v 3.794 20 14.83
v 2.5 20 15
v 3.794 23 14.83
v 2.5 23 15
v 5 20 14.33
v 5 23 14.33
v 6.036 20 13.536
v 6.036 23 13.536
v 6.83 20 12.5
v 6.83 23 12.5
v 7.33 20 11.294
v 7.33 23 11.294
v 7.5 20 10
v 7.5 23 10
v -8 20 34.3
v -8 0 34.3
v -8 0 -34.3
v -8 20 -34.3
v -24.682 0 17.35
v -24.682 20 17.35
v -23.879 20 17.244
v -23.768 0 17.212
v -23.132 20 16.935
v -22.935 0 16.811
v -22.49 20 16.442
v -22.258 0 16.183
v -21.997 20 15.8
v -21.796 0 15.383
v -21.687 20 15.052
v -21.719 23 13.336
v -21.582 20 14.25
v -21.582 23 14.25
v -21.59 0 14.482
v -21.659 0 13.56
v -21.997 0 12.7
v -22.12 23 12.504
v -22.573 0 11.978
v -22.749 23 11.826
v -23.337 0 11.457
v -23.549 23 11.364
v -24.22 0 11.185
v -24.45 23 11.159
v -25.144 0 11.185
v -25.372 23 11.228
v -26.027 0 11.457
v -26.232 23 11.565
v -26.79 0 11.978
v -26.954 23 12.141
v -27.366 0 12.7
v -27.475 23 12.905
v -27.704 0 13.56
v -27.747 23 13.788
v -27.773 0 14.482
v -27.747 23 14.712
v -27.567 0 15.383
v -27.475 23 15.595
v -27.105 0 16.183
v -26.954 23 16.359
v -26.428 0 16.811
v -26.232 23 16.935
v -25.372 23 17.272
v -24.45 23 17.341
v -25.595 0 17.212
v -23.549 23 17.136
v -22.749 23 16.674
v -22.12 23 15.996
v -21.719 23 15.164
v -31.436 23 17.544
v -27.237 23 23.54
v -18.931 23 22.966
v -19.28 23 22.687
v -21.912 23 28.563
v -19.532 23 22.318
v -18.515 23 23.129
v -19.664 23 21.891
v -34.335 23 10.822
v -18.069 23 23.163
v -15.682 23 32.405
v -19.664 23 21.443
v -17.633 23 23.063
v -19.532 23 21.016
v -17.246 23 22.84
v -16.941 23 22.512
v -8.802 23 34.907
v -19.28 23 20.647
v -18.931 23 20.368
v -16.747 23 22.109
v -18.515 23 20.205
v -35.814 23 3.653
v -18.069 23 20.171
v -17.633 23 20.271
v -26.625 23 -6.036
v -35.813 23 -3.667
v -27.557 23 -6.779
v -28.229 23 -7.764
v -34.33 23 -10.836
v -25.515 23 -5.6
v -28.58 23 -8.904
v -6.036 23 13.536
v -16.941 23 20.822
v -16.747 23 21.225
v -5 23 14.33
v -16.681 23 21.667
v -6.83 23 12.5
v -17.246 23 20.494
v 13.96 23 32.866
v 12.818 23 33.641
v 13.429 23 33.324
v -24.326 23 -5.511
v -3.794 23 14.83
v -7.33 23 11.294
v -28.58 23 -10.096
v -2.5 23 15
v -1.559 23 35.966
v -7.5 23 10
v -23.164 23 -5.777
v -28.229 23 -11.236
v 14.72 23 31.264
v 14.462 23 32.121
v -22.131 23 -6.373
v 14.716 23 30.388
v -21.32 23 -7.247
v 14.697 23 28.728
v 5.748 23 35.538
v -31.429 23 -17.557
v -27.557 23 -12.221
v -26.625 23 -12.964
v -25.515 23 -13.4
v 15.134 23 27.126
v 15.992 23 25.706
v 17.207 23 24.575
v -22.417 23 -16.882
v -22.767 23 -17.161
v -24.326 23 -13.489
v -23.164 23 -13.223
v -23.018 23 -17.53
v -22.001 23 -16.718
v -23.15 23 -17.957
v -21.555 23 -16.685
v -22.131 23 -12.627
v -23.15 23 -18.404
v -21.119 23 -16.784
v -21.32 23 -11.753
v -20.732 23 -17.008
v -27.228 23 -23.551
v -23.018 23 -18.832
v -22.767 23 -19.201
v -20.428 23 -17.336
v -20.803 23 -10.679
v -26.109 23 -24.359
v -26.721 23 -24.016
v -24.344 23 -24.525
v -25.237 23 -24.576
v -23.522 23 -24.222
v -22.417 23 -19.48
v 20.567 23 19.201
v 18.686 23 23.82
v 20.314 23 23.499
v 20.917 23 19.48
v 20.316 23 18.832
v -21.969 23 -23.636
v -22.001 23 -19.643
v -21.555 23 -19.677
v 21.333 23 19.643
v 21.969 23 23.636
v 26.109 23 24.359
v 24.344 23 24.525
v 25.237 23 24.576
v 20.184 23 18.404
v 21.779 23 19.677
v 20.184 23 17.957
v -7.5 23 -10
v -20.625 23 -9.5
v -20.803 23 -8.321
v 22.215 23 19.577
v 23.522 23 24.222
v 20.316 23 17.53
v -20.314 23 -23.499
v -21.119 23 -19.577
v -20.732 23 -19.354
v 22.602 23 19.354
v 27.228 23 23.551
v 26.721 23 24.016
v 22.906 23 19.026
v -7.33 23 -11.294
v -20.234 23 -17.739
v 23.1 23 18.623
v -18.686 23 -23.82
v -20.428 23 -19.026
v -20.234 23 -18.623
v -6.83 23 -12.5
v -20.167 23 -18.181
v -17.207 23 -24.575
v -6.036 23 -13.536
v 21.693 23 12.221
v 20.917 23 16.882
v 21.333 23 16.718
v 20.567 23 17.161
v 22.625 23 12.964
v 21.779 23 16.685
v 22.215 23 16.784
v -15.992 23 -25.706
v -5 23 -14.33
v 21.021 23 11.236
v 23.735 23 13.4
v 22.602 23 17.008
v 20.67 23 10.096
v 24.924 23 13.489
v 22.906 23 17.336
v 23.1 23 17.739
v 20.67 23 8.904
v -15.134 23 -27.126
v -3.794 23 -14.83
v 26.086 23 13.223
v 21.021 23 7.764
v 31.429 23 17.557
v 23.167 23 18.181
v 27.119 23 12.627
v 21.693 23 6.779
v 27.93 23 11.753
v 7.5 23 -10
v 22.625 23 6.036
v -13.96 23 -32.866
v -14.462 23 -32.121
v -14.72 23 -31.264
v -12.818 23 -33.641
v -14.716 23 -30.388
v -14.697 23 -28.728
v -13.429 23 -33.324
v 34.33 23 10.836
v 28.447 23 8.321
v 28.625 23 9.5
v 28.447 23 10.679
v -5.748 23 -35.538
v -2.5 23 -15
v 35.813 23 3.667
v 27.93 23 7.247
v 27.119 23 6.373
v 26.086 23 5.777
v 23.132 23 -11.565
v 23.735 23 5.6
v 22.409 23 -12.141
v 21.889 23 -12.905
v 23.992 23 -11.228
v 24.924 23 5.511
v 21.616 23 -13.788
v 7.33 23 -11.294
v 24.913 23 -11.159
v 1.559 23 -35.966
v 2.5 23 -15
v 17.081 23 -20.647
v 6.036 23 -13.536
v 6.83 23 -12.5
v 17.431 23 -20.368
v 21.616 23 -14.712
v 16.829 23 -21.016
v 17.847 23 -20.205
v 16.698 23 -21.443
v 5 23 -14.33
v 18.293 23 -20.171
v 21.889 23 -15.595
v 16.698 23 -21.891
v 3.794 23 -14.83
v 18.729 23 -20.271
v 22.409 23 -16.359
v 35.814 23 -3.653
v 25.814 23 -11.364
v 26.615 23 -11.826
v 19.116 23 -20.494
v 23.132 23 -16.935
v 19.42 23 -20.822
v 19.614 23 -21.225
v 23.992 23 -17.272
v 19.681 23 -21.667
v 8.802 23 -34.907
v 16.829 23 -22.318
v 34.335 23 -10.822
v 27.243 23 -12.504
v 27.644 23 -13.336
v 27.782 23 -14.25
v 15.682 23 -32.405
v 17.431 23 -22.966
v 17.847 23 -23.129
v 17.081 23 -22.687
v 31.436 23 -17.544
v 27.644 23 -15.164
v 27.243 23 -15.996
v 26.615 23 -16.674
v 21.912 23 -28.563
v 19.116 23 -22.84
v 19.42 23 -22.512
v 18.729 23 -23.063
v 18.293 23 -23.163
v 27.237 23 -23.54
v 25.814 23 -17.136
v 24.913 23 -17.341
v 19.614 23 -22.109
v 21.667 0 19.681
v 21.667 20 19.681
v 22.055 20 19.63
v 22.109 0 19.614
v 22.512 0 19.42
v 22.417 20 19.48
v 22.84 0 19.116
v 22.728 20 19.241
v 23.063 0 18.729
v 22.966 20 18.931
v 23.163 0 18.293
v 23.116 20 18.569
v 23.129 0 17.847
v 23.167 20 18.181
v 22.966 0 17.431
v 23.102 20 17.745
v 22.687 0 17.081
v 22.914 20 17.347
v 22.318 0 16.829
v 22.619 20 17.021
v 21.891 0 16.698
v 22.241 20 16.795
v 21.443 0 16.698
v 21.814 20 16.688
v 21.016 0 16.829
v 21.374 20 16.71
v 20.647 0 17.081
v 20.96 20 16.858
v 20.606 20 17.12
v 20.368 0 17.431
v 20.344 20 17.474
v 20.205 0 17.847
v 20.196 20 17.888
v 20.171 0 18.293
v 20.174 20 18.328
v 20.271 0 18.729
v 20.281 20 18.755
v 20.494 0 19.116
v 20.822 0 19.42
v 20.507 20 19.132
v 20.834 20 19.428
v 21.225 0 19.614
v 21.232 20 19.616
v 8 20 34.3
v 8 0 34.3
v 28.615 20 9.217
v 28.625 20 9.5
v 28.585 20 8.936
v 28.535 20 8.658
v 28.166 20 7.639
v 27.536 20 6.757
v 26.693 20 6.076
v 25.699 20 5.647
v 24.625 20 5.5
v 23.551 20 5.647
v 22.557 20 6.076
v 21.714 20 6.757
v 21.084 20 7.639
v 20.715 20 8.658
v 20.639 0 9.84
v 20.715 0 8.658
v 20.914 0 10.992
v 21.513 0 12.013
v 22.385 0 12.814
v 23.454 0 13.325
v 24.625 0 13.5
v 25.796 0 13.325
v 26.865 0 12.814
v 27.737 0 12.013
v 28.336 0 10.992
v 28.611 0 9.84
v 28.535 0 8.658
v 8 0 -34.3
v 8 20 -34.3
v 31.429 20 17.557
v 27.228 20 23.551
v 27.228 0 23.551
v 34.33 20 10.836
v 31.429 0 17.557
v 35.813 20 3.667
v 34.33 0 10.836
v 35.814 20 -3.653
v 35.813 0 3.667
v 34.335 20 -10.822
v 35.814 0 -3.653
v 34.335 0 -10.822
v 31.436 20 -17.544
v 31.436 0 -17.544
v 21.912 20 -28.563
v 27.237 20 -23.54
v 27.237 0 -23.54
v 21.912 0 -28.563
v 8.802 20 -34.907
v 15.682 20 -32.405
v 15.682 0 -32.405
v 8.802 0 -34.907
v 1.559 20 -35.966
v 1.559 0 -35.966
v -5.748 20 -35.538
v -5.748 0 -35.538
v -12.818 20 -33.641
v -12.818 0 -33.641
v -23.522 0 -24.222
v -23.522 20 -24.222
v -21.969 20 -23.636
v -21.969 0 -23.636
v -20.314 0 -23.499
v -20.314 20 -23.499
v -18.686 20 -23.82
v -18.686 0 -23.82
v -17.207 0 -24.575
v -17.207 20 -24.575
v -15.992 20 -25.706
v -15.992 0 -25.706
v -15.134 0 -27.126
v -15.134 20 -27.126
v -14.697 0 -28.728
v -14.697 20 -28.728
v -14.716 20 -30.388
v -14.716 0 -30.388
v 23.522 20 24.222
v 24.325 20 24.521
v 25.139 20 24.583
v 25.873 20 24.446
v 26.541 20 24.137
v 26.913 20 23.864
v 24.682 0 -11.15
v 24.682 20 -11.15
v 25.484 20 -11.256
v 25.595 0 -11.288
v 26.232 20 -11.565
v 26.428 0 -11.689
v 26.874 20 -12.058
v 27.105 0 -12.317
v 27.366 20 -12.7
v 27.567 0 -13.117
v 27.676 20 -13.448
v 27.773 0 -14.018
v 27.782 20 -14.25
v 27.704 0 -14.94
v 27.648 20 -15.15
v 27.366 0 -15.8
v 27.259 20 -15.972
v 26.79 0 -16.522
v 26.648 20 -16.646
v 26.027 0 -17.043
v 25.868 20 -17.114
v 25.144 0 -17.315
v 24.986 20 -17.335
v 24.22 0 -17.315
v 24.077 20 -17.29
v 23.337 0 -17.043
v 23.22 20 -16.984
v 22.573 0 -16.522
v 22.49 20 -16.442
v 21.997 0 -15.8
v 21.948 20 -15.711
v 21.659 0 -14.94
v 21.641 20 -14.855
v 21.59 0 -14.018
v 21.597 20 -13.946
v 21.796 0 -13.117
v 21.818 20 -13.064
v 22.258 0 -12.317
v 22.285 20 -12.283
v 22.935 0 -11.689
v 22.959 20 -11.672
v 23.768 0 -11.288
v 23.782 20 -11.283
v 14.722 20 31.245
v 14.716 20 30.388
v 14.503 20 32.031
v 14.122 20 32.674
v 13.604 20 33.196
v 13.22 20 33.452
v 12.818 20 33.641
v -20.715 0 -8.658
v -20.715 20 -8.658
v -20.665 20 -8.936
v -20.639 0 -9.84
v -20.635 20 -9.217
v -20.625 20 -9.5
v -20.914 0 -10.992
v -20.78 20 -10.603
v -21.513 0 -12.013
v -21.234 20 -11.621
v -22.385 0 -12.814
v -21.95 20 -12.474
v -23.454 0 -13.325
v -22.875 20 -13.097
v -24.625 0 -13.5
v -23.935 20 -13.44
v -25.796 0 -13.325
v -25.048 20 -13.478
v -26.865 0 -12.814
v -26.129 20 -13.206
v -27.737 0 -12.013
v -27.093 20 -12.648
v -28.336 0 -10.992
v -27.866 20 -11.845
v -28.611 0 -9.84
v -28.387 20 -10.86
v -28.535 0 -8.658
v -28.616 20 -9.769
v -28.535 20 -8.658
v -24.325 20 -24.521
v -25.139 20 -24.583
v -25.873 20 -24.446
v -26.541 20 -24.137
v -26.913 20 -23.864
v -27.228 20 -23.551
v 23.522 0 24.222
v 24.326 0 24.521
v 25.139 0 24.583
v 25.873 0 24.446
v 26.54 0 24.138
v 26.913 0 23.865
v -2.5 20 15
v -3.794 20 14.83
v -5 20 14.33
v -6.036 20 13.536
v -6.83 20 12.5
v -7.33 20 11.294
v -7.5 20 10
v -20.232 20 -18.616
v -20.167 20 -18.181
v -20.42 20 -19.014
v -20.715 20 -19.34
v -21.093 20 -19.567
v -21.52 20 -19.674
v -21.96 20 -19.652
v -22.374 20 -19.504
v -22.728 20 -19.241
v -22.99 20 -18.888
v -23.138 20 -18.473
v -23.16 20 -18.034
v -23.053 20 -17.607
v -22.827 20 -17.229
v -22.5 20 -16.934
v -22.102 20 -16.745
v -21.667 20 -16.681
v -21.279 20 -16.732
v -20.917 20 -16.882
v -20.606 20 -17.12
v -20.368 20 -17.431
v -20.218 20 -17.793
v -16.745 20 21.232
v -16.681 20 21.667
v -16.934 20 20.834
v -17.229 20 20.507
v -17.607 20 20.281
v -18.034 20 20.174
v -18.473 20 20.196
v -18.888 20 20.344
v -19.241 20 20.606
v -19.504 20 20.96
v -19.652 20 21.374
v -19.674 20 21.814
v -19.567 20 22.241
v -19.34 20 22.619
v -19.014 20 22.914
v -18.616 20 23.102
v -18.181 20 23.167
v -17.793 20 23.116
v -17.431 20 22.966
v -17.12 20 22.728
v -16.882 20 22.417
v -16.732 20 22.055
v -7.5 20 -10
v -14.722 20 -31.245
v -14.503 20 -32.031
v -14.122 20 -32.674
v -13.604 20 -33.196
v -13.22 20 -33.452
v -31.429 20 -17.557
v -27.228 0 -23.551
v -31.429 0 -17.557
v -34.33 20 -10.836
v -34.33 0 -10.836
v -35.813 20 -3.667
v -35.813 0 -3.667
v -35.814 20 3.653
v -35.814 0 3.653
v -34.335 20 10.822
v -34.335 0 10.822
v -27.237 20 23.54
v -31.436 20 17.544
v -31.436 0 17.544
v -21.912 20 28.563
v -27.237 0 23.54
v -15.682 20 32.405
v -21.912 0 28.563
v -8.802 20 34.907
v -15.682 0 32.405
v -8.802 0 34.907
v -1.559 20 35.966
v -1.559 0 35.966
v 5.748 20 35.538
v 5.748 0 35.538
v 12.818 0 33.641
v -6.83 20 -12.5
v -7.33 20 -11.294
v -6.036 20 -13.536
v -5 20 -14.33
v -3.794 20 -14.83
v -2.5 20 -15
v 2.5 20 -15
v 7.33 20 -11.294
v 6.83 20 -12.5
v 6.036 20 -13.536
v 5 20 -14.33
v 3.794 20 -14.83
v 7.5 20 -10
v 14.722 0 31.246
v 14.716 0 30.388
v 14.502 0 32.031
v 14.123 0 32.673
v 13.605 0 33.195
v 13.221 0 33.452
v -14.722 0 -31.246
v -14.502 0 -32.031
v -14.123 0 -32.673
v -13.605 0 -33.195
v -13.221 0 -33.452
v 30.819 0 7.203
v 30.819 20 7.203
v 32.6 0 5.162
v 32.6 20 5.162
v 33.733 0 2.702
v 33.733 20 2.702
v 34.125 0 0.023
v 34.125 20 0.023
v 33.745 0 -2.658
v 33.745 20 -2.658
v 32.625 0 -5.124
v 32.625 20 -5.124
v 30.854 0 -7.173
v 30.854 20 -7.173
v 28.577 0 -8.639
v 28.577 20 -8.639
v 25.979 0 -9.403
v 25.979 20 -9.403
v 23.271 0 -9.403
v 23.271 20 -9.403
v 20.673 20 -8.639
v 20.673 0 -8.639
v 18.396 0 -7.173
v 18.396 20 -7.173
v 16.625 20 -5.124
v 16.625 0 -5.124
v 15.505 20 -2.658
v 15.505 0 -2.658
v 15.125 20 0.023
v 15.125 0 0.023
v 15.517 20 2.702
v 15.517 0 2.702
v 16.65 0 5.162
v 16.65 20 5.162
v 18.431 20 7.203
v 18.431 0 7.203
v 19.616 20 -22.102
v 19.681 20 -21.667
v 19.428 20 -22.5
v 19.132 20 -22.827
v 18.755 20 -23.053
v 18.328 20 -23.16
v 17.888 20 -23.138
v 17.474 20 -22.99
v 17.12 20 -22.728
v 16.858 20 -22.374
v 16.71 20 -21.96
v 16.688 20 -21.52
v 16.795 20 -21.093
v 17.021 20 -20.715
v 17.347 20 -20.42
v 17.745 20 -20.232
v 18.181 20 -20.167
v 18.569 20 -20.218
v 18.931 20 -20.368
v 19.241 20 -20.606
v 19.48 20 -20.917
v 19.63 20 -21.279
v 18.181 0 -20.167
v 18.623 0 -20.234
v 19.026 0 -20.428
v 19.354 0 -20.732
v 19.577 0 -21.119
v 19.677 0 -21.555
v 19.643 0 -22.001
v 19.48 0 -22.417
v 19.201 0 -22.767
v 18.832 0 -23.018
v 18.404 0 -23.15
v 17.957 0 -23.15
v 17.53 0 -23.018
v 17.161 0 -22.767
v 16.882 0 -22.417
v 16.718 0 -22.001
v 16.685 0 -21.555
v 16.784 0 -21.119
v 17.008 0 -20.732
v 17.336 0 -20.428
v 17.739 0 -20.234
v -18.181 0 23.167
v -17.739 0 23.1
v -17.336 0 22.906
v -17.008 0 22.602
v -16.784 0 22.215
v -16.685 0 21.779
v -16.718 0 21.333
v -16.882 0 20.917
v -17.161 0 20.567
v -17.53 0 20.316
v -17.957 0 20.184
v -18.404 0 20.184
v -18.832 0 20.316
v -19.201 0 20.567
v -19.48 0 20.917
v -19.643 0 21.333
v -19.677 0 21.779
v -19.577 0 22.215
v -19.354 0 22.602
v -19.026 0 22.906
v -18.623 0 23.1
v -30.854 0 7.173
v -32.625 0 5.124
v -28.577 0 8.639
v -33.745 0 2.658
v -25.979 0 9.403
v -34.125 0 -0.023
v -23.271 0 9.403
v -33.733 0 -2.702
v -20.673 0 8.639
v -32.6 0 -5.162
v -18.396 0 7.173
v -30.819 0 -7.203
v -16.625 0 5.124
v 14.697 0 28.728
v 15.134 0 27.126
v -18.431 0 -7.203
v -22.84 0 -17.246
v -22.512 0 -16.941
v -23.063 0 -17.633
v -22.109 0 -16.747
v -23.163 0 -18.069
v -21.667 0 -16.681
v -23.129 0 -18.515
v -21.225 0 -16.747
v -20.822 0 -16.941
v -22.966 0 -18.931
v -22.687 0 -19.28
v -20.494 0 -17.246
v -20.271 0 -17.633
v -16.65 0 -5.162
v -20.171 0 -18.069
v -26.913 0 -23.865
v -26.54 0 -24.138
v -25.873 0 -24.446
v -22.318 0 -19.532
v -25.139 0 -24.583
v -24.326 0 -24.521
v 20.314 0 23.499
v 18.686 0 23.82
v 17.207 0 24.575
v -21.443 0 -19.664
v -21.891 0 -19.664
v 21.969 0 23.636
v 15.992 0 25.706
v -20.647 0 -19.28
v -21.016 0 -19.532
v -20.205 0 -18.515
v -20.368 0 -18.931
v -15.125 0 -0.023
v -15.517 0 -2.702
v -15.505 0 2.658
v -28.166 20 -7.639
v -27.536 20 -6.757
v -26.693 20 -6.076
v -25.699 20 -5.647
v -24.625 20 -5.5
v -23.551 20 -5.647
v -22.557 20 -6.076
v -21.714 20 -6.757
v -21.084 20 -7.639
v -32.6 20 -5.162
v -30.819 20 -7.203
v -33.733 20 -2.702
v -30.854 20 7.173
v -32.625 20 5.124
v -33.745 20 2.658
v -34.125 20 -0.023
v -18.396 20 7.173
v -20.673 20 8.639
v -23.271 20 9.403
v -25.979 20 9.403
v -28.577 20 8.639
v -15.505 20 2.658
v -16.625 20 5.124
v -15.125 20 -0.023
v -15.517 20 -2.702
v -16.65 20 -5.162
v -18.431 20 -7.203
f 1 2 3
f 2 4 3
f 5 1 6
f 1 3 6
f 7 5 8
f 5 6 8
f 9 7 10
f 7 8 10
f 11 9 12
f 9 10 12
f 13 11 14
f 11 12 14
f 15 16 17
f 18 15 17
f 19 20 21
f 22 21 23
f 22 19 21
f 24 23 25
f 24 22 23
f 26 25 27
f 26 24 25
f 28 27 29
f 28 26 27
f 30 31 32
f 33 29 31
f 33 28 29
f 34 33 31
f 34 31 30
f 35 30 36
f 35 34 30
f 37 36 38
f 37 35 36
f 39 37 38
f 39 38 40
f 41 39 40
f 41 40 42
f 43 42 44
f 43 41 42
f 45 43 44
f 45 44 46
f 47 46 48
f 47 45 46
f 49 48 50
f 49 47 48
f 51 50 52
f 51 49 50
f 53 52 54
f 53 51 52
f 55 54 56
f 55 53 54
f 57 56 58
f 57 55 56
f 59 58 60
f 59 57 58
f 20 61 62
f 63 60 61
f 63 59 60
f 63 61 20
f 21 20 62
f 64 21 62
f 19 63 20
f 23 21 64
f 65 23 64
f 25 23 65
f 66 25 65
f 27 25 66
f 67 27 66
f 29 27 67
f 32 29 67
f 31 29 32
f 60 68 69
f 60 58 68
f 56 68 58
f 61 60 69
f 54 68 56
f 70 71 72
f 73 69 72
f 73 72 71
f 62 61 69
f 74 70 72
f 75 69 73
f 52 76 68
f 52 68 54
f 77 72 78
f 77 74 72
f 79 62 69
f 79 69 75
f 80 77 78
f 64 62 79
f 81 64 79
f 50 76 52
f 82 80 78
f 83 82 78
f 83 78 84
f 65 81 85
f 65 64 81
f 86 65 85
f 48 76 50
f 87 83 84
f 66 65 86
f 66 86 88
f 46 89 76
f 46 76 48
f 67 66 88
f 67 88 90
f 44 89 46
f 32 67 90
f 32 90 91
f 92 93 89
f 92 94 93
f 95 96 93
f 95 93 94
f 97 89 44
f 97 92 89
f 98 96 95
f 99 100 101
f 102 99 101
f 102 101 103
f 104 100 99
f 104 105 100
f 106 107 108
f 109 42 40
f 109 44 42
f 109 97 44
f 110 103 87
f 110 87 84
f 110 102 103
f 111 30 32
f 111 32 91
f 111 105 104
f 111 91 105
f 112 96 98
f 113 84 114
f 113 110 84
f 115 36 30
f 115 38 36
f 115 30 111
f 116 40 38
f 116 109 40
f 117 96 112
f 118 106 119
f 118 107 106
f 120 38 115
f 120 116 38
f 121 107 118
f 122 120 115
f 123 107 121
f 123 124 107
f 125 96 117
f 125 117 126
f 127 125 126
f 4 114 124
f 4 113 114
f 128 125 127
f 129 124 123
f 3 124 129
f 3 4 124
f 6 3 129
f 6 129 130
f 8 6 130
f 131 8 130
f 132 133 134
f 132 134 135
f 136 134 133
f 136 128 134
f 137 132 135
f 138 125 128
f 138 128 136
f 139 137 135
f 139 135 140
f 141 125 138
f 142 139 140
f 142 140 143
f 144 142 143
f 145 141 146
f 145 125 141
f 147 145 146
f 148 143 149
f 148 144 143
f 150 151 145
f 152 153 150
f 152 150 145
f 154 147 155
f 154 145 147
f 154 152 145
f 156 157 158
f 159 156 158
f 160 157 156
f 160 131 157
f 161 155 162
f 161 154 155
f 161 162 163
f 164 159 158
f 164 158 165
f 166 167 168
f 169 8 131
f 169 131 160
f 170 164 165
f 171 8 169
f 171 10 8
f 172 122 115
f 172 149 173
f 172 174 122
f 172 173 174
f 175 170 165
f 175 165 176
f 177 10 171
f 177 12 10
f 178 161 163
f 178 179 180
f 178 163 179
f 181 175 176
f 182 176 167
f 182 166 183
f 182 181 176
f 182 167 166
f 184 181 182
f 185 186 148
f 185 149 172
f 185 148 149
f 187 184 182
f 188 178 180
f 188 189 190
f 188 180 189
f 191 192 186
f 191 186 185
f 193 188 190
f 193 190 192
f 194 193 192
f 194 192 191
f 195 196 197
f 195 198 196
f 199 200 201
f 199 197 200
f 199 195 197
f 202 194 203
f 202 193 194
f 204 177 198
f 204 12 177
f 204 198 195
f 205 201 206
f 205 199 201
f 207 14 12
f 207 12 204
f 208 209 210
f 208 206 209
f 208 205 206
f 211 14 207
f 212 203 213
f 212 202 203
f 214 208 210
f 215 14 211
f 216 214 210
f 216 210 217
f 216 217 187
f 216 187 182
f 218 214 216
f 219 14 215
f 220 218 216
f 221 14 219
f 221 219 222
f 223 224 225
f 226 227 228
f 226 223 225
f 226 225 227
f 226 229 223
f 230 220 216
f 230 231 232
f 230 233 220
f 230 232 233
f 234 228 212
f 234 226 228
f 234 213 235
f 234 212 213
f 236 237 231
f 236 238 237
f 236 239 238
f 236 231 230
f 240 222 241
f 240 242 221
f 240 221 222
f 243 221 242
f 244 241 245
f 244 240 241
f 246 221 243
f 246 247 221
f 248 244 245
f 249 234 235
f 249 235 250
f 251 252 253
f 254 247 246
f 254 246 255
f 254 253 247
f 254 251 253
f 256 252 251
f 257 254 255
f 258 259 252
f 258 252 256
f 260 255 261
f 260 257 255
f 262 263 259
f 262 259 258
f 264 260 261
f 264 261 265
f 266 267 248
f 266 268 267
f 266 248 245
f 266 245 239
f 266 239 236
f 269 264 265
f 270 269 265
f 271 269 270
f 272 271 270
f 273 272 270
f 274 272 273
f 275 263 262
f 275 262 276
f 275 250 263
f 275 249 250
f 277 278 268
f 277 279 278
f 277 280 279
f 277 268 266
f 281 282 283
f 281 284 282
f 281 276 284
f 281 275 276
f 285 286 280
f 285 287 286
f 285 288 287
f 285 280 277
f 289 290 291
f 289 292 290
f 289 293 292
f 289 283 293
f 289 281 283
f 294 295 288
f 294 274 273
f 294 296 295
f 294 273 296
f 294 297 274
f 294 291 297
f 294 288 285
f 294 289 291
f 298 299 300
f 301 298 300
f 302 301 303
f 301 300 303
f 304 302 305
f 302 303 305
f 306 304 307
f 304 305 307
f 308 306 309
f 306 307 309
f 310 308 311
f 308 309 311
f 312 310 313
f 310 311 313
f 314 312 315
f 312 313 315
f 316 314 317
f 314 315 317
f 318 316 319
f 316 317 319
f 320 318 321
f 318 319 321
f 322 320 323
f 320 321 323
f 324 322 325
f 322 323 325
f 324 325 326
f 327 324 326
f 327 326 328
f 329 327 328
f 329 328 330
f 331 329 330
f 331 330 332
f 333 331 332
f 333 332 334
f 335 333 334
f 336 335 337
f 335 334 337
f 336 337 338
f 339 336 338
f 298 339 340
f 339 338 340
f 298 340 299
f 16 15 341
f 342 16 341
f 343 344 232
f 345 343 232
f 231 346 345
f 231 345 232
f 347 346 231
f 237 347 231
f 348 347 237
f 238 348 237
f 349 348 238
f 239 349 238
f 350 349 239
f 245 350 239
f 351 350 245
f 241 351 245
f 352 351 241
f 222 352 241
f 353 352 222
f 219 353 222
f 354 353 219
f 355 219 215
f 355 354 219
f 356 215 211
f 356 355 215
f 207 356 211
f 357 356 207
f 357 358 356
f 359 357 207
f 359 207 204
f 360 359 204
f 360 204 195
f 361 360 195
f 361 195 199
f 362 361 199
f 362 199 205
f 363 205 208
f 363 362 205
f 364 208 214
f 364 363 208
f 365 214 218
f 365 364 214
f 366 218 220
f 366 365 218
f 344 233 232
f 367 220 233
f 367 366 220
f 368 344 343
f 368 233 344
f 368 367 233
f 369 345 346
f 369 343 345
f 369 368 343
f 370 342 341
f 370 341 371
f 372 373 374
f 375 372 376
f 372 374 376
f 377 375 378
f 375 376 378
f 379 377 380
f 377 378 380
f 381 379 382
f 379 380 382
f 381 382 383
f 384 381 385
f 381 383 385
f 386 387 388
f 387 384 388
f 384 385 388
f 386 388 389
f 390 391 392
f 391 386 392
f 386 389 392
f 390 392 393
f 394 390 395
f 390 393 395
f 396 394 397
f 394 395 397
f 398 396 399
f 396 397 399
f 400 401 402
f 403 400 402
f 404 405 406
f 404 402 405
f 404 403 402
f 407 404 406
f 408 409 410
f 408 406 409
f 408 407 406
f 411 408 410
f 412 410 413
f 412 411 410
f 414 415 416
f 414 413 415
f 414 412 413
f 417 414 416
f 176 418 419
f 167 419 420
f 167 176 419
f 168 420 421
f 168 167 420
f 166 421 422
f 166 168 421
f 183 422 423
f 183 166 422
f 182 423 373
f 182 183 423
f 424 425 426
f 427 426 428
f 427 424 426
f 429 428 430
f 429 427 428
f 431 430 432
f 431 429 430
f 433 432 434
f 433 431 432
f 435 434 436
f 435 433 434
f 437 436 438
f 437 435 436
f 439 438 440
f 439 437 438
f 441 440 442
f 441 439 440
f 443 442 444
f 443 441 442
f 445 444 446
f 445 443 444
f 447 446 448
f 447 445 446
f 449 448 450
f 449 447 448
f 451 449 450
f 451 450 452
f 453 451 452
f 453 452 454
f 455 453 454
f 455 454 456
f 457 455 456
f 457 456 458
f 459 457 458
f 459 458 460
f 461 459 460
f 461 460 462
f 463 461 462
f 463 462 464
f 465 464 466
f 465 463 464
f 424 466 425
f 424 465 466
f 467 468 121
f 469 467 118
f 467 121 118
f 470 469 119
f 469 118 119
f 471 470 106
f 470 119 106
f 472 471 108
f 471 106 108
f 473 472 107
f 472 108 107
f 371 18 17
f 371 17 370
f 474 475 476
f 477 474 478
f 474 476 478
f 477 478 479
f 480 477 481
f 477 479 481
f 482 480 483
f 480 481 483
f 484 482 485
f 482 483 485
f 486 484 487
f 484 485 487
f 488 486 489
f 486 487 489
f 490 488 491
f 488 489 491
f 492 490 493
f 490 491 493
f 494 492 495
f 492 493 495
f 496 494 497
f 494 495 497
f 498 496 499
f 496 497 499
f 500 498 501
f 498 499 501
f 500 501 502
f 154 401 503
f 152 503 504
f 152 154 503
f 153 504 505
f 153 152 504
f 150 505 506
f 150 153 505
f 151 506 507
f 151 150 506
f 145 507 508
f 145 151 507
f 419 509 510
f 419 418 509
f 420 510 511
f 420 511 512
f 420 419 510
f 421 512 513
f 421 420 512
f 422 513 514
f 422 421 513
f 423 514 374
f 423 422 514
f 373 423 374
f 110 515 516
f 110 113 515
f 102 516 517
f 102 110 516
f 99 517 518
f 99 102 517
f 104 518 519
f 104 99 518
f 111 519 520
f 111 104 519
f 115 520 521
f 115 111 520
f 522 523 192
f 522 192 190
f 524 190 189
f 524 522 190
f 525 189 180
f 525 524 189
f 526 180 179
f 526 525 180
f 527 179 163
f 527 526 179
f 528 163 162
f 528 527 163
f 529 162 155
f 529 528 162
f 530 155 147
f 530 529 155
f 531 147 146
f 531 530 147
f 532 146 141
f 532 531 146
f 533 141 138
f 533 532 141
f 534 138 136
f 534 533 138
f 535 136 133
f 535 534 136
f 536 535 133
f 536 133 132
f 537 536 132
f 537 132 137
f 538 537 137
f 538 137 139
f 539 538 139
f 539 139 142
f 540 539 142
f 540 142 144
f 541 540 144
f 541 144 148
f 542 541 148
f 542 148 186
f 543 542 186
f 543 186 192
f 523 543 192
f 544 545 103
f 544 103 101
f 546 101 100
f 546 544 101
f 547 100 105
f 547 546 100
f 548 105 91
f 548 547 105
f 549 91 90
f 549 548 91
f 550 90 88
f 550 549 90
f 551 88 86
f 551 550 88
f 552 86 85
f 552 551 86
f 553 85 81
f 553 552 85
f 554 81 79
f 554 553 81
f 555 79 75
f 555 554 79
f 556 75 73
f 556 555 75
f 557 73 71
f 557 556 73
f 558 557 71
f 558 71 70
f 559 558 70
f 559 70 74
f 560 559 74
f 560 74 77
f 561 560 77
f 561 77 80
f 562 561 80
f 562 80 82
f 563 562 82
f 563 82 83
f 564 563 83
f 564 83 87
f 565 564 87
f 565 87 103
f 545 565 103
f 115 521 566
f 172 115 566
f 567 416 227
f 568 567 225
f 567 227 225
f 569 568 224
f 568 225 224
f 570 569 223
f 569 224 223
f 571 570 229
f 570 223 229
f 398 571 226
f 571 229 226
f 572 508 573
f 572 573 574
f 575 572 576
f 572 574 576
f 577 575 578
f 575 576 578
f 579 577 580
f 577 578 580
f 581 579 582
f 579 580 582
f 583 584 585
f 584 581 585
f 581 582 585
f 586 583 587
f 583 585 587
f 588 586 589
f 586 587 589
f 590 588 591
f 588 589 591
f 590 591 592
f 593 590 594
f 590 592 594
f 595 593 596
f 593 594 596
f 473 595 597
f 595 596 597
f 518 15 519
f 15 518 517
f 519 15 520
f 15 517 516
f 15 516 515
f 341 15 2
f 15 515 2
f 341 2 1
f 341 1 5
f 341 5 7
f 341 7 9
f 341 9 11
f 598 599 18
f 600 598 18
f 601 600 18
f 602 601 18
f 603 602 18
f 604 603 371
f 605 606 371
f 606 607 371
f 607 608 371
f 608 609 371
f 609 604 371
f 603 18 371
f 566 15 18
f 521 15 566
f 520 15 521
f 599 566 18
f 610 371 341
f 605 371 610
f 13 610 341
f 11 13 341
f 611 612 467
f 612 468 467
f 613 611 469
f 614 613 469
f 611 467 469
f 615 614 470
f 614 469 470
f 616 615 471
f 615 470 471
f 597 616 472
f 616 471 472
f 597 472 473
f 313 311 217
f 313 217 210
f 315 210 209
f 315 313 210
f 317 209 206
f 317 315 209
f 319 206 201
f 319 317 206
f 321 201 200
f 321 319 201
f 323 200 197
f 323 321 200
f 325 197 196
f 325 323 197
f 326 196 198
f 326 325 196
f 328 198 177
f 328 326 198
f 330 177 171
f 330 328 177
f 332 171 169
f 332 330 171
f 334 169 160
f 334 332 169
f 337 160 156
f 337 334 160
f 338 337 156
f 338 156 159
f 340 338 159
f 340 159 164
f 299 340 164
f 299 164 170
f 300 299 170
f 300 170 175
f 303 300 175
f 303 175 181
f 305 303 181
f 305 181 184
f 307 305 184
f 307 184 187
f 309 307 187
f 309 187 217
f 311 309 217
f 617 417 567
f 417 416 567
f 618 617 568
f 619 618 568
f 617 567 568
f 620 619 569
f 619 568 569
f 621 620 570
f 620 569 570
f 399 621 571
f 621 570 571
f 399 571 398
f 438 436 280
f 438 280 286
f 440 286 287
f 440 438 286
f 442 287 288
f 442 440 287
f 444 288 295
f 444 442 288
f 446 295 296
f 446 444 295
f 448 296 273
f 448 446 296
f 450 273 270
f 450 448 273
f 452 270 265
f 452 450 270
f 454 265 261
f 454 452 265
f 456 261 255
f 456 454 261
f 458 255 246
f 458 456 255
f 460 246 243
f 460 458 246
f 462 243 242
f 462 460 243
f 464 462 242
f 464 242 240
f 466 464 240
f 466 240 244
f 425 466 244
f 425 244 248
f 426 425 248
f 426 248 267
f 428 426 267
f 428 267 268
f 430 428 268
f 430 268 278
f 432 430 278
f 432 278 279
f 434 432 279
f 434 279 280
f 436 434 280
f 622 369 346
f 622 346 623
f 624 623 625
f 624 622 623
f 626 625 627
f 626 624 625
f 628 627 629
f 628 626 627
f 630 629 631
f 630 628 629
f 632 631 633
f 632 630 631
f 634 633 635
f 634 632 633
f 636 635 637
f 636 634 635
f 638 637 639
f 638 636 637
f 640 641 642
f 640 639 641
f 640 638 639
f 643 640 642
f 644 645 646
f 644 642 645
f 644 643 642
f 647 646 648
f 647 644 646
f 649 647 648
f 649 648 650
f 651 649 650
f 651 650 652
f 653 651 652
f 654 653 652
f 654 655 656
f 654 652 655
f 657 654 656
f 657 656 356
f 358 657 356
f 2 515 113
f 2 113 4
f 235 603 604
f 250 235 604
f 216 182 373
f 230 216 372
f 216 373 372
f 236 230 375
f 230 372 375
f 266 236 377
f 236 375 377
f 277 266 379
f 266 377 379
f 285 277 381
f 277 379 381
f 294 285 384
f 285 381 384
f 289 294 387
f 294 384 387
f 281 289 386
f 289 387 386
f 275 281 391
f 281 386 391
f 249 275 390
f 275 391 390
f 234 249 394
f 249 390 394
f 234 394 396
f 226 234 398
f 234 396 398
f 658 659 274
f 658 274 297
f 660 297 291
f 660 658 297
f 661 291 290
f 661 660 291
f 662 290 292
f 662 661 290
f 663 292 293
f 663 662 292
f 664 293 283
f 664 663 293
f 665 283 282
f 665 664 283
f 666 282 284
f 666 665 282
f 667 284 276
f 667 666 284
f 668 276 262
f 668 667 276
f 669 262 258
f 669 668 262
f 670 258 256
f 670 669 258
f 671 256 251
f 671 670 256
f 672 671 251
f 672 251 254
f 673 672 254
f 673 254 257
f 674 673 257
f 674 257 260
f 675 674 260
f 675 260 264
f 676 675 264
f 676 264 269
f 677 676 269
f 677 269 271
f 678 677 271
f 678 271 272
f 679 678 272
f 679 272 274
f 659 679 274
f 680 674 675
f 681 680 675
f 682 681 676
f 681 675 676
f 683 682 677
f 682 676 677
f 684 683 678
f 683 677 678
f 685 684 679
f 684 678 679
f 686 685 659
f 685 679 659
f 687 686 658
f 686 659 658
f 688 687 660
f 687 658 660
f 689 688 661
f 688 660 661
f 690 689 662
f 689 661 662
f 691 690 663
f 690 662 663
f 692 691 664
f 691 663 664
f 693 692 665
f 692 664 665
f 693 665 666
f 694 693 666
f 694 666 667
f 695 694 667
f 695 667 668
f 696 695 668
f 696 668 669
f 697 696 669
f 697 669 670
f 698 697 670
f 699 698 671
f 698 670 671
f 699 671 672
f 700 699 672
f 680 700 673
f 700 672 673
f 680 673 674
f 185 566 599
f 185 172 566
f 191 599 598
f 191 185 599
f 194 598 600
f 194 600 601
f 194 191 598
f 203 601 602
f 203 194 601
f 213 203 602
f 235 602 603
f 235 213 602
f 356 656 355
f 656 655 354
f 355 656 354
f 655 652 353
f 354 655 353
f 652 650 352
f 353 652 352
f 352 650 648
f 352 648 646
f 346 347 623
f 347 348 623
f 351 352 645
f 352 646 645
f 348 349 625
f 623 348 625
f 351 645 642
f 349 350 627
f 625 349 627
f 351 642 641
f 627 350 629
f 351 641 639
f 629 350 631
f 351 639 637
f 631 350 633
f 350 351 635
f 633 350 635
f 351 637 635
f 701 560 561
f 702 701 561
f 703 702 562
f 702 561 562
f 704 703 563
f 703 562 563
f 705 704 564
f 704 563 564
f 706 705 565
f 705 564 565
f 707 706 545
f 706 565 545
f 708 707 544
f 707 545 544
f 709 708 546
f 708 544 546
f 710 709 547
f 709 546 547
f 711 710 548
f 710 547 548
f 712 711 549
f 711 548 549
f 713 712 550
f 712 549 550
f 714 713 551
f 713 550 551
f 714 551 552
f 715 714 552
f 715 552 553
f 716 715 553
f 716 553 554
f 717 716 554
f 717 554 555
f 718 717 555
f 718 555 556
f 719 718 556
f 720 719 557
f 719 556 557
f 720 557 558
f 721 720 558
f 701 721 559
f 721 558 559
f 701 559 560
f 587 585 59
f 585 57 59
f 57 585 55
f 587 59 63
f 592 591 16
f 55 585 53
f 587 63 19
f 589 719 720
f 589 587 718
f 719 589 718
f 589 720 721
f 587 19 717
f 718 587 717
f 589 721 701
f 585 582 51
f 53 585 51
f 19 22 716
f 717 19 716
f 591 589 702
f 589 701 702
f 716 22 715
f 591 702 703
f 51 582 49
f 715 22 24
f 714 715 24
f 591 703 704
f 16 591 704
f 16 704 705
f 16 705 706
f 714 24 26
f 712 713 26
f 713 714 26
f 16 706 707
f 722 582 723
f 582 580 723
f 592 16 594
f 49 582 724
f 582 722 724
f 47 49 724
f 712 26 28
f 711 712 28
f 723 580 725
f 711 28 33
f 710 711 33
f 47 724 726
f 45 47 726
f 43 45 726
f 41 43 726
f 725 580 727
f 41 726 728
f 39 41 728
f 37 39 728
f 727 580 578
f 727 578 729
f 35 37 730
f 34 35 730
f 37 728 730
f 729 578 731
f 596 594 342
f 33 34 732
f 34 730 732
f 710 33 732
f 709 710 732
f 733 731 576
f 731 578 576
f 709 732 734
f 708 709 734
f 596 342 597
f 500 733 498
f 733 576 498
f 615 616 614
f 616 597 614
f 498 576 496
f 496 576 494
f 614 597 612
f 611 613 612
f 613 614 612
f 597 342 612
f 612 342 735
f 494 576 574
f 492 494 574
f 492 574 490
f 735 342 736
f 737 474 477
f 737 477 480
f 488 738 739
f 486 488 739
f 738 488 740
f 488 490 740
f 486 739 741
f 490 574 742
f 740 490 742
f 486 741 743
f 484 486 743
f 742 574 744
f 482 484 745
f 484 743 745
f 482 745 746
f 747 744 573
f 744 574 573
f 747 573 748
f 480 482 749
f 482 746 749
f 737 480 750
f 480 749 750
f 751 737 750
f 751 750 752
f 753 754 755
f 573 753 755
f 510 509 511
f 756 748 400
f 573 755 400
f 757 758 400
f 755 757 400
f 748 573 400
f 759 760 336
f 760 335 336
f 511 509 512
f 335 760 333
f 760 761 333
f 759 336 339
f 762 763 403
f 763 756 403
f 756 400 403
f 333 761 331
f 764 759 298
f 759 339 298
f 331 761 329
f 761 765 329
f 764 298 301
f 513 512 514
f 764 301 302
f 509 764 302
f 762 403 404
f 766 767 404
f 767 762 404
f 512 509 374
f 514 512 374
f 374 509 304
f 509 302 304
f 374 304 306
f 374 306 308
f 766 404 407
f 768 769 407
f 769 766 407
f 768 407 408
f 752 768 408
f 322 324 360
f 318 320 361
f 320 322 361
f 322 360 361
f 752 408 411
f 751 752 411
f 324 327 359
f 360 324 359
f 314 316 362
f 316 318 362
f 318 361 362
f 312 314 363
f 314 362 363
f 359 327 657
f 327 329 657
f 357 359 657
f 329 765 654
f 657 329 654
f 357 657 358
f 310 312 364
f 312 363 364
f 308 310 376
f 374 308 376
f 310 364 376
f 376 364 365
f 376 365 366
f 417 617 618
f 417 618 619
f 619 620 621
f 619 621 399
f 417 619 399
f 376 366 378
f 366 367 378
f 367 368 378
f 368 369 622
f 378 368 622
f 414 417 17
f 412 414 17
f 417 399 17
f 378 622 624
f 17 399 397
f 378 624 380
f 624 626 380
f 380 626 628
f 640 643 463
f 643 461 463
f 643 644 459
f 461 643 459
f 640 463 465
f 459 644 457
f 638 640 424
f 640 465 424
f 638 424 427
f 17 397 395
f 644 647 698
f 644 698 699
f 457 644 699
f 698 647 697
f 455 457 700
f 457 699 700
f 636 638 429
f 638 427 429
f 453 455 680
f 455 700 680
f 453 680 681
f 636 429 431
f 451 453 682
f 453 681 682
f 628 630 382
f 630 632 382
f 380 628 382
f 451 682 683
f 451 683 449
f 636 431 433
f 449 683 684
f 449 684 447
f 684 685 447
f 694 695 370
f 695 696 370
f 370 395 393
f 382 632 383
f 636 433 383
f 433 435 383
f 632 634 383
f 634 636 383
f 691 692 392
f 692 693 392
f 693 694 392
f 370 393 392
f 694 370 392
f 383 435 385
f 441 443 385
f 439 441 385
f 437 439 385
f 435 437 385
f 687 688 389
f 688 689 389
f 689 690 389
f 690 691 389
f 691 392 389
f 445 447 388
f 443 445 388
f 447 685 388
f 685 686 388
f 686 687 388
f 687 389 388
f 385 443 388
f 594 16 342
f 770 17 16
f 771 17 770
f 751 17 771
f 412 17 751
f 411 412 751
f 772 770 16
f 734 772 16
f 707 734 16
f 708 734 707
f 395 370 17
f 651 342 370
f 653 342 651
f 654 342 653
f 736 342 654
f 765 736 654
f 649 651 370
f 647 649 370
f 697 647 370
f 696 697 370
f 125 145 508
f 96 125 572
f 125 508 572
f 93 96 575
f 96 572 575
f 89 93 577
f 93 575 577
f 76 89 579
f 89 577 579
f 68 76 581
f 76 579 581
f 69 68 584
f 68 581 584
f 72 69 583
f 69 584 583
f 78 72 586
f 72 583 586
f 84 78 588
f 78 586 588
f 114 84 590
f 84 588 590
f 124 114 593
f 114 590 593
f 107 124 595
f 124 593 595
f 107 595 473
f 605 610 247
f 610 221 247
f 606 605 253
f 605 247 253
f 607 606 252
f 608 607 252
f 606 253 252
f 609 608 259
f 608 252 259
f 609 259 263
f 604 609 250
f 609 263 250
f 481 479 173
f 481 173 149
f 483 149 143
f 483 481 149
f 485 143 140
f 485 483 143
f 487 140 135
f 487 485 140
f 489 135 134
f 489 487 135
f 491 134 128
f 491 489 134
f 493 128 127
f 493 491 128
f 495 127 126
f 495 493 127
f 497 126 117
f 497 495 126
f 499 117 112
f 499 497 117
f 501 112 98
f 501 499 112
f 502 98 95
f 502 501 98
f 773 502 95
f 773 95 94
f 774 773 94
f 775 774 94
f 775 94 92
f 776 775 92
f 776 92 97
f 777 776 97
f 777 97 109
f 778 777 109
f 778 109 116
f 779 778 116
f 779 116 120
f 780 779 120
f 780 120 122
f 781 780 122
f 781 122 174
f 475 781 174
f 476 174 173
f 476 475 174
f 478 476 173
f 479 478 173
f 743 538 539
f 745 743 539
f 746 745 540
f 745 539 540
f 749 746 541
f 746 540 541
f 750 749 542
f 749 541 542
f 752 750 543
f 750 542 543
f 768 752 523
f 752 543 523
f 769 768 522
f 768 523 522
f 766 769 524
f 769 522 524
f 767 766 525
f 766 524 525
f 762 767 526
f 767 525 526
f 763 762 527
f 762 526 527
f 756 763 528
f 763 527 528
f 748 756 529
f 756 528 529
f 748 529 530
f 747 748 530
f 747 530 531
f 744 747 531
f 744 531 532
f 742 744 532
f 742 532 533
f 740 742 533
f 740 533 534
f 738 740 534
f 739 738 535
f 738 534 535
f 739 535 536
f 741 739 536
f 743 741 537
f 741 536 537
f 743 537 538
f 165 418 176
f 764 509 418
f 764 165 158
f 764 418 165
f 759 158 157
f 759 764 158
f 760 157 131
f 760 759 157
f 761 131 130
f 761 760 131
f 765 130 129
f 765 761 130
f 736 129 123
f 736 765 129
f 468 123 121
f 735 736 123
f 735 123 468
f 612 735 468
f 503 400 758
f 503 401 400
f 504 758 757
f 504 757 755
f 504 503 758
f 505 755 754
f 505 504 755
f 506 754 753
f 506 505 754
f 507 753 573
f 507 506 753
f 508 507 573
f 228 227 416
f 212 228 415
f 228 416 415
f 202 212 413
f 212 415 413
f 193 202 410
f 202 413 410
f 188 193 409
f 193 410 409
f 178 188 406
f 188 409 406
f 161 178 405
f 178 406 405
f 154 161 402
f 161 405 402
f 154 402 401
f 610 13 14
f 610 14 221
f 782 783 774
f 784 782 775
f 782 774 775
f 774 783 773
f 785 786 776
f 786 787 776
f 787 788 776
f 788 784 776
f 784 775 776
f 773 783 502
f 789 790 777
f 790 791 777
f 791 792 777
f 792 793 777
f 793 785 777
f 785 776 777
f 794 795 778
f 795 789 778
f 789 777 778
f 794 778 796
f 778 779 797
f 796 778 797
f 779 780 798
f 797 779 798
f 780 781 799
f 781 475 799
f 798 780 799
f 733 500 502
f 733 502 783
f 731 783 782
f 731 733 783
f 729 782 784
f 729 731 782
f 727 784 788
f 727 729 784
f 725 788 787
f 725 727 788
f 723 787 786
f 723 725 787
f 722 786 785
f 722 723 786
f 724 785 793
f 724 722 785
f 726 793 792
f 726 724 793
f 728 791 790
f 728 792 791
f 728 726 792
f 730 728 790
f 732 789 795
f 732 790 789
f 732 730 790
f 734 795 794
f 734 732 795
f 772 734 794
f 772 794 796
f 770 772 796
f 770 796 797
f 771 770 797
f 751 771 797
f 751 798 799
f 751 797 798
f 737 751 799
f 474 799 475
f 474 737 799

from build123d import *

# Parameters (mm, degrees)
BOSS_EXTRUDE1_OUTLINE_R   = 36
BOSS_EXTRUDE1_OUTLINE_R_2 = 9.5
BOSS_EXTRUDE1_OUTLINE_W   = 16
BOSS_EXTRUDE1_OUTLINE_H   = 68.6
BOSS_EXTRUDE1_DEPTH       = 20
SKETCH4_R                 = 3.999999999999999
CUT_EXTRUDE6_DEPTH        = 55.699177324709375
SKETCH5_R                 = 1.5000000000000009
CUT_EXTRUDE2_DEPTH        = 20
CUT_EXTRUDE4_DEPTH        = 55.699177324709375
CUT_EXTRUDE4_DEPTH_BACK   = 55.699177324709375
SKETCH6_R                 = 3.0999999999999988
CUT_EXTRUDE5_DEPTH        = 55.699177324709375
CUT_EXTRUDE5_DEPTH_BACK   = 55.699177324709375
BOSS_EXTRUDE2_OUTLINE_R   = 1.5
BOSS_EXTRUDE2_OUTLINE_R_2 = 3.1
BOSS_EXTRUDE2_OUTLINE_W   = 16
BOSS_EXTRUDE2_OUTLINE_H   = 68.6
BOSS_EXTRUDE2_OUTLINE_R_3 = 4
BOSS_EXTRUDE2_DEPTH       = 3
SKETCH9_3_W               = 16
SKETCH9_3_H               = 68.6
SKETCH9_3_W_2             = 15
SKETCH9_3_H_2             = 30
BOSS_EXTRUDE3_DEPTH       = 3
CIRPATTERN1_DEPTH         = 23
FILLET1_R                 = 5
FILLET2_R                 = 3


# Read off the part's stored shape, not the designer's step: Boss-Extrude1, Boss-Extrude2, CirPattern1
with BuildPart() as part:
    # Boss-Extrude1 outline → Boss-Extrude1 (new body)
    with BuildSketch(Plane(origin=(0, 0, 0), x_dir=(1, 0, 0), z_dir=(0, 1, 0))):
        Circle(BOSS_EXTRUDE1_OUTLINE_R)
        with Locations((-24.625, 0)):
            Circle(BOSS_EXTRUDE1_OUTLINE_R_2, mode=Mode.SUBTRACT)
        Rectangle(BOSS_EXTRUDE1_OUTLINE_W, BOSS_EXTRUDE1_OUTLINE_H, mode=Mode.SUBTRACT)
        with Locations((24.625, 0)):
            Circle(BOSS_EXTRUDE1_OUTLINE_R_2, mode=Mode.SUBTRACT)
    extrude(amount=BOSS_EXTRUDE1_DEPTH)

    # Sketch4 → Cut-Extrude6 (cut, through all)
    with BuildSketch(Plane(origin=(0, 20, 0), x_dir=(1, 0, 0), z_dir=(0, 1, 0))):
        with Locations((-24.625, 9.500000000000002)):
            Circle(SKETCH4_R)
        with Locations((24.625, -9.500000000000002)):
            Circle(SKETCH4_R)
    extrude(amount=-CUT_EXTRUDE6_DEPTH, mode=Mode.SUBTRACT)

    # Sketch5 → Cut-Extrude2 (cut)
    with BuildSketch(Plane(origin=(0, 20, 0), x_dir=(1, 0, 0), z_dir=(0, 1, 0))):
        with Locations(Location((-21.667008816788154, 18.18077910688168, 0), (0, 0, 270))):
            Circle(SKETCH5_R)
        with Locations(Location((18.180779106881676, 21.667008816788137, 0), (0, 0, 270))):
            Circle(SKETCH5_R)
        with Locations(Location((-18.18077910688169, -21.66700881678815, 0), (0, 0, 270))):
            Circle(SKETCH5_R)
        with Locations(Location((21.667008816788147, -18.180779106881687, 0), (0, 0, 270))):
            Circle(SKETCH5_R)
    extrude(amount=-CUT_EXTRUDE2_DEPTH, mode=Mode.SUBTRACT)

    # Sketch6 → Cut-Extrude4 (cut, two sides: drawn at the far end of the back side and taken through both)
    with BuildSketch(Plane(origin=(0, 20, 0), x_dir=(1, 0, 0), z_dir=(0, 1, 0)).offset(-CUT_EXTRUDE4_DEPTH_BACK)):
        with Locations(Location((-24.68172400785648, -14.250000000000037, 0), (0, 0, 270))):
            Circle(SKETCH6_R)
        with Locations(Location((24.68172400785648, 14.25000000000004, 0), (0, 0, 270))):
            Circle(SKETCH6_R)
    extrude(amount=CUT_EXTRUDE4_DEPTH + CUT_EXTRUDE4_DEPTH_BACK, mode=Mode.SUBTRACT)

    # Sketch7 → Cut-Extrude5 (cut, two sides: drawn at the far end of the back side and taken through both)
    with BuildSketch(Plane(origin=(0, 20, 0), x_dir=(1, 0, 0), z_dir=(0, 1, 0)).offset(-CUT_EXTRUDE5_DEPTH_BACK)):
        with BuildLine():
            ThreePointArc((-25.25978035738815, 25.650409281266985), (-17.20729309053125, 24.574561328669844), (-15.46414662353581, 32.50938586325165))
            ThreePointArc((-15.46414662353581, 32.50938586325165), (-20.64875170863751, 29.48947359440382), (-25.25978035738815, 25.650409281266985))
        make_face()
    extrude(amount=CUT_EXTRUDE5_DEPTH + CUT_EXTRUDE5_DEPTH_BACK, mode=Mode.SUBTRACT)

    # Boss-Extrude2 outline → Boss-Extrude2 (add)
    with BuildSketch(Plane(origin=(0, 20, 0), x_dir=(1, 0, 0), z_dir=(0, 1, 0))):
        with BuildLine():
            ThreePointArc((-25.259780357, 25.650409281), (20.648751711, -29.489473593), (-15.464146624, 32.509385863))
            ThreePointArc((-15.464146624, 32.509385863), (-17.207293091, 24.574561329), (-25.259780357, 25.650409281))
        make_face()
        with Locations((-18.180779107, -21.667008817)):
            Circle(BOSS_EXTRUDE2_OUTLINE_R, mode=Mode.SUBTRACT)
        with Locations((-24.681724008, -14.25)):
            Circle(BOSS_EXTRUDE2_OUTLINE_R_2, mode=Mode.SUBTRACT)
        Rectangle(BOSS_EXTRUDE2_OUTLINE_W, BOSS_EXTRUDE2_OUTLINE_H, mode=Mode.SUBTRACT)
        with Locations((21.667008817, -18.180779107)):
            Circle(BOSS_EXTRUDE2_OUTLINE_R, mode=Mode.SUBTRACT)
        with Locations((24.625, -9.5)):
            Circle(BOSS_EXTRUDE2_OUTLINE_R_3, mode=Mode.SUBTRACT)
        with Locations((-24.625, 9.5)):
            Circle(BOSS_EXTRUDE2_OUTLINE_R_3, mode=Mode.SUBTRACT)
        with Locations((-21.667008817, 18.180779107)):
            Circle(BOSS_EXTRUDE2_OUTLINE_R, mode=Mode.SUBTRACT)
        with Locations((24.681724008, 14.25)):
            Circle(BOSS_EXTRUDE2_OUTLINE_R_2, mode=Mode.SUBTRACT)
        with Locations((18.180779107, 21.667008817)):
            Circle(BOSS_EXTRUDE2_OUTLINE_R, mode=Mode.SUBTRACT)
    extrude(amount=BOSS_EXTRUDE2_DEPTH)

    # Sketch9<3> → Boss-Extrude3 (add)
    with BuildSketch(Plane(origin=(0, 20, 0), x_dir=(1, 0, 0), z_dir=(0, 1, 0))):
        Rectangle(SKETCH9_3_W, SKETCH9_3_H)
        Rectangle(SKETCH9_3_W_2, SKETCH9_3_H_2, mode=Mode.SUBTRACT)
    extrude(amount=BOSS_EXTRUDE3_DEPTH)

    # CirPattern1 outline → CirPattern1 (cut)
    with BuildSketch(Plane(origin=(0, 0, 0), x_dir=(1, 0, 0), z_dir=(0, 1, 0))):
        with BuildLine():
            ThreePointArc((15.464146624, -32.509385863), (20.648751709, -29.489473594), (25.259780357, -25.650409281))
            ThreePointArc((25.259780357, -25.650409281), (17.207293091, -24.574561329), (15.464146624, -32.509385863))
        make_face()
    extrude(amount=CIRPATTERN1_DEPTH, mode=Mode.SUBTRACT)

    # Fillet1
    fillet1_edges = [part.edges().sort_by_distance(p)[0] for p in [
        (7.499999999999997, 21.5, -14.999999999999998),
        (7.499999999999997, 21.5, 15.000000000000002),
        (-7.500000000000003, 21.5, 15.000000000000002),
        (-7.500000000000003, 21.5, -14.999999999999998),
    ]]
    fillet(fillet1_edges, radius=FILLET1_R)

    # Fillet2
    fillet2_edges = [part.edges().sort_by_distance(p)[0] for p in [
        (25.259780357000004, 10, 25.650409281),
        (15.464146623999998, 10, 32.509385863),
        (-25.259780357388152, 10, -25.650409281266985),
        (-15.46414662353581, 10, -32.50938586325165),
    ]]
    fillet(fillet2_edges, radius=FILLET2_R)


solid = part.part
